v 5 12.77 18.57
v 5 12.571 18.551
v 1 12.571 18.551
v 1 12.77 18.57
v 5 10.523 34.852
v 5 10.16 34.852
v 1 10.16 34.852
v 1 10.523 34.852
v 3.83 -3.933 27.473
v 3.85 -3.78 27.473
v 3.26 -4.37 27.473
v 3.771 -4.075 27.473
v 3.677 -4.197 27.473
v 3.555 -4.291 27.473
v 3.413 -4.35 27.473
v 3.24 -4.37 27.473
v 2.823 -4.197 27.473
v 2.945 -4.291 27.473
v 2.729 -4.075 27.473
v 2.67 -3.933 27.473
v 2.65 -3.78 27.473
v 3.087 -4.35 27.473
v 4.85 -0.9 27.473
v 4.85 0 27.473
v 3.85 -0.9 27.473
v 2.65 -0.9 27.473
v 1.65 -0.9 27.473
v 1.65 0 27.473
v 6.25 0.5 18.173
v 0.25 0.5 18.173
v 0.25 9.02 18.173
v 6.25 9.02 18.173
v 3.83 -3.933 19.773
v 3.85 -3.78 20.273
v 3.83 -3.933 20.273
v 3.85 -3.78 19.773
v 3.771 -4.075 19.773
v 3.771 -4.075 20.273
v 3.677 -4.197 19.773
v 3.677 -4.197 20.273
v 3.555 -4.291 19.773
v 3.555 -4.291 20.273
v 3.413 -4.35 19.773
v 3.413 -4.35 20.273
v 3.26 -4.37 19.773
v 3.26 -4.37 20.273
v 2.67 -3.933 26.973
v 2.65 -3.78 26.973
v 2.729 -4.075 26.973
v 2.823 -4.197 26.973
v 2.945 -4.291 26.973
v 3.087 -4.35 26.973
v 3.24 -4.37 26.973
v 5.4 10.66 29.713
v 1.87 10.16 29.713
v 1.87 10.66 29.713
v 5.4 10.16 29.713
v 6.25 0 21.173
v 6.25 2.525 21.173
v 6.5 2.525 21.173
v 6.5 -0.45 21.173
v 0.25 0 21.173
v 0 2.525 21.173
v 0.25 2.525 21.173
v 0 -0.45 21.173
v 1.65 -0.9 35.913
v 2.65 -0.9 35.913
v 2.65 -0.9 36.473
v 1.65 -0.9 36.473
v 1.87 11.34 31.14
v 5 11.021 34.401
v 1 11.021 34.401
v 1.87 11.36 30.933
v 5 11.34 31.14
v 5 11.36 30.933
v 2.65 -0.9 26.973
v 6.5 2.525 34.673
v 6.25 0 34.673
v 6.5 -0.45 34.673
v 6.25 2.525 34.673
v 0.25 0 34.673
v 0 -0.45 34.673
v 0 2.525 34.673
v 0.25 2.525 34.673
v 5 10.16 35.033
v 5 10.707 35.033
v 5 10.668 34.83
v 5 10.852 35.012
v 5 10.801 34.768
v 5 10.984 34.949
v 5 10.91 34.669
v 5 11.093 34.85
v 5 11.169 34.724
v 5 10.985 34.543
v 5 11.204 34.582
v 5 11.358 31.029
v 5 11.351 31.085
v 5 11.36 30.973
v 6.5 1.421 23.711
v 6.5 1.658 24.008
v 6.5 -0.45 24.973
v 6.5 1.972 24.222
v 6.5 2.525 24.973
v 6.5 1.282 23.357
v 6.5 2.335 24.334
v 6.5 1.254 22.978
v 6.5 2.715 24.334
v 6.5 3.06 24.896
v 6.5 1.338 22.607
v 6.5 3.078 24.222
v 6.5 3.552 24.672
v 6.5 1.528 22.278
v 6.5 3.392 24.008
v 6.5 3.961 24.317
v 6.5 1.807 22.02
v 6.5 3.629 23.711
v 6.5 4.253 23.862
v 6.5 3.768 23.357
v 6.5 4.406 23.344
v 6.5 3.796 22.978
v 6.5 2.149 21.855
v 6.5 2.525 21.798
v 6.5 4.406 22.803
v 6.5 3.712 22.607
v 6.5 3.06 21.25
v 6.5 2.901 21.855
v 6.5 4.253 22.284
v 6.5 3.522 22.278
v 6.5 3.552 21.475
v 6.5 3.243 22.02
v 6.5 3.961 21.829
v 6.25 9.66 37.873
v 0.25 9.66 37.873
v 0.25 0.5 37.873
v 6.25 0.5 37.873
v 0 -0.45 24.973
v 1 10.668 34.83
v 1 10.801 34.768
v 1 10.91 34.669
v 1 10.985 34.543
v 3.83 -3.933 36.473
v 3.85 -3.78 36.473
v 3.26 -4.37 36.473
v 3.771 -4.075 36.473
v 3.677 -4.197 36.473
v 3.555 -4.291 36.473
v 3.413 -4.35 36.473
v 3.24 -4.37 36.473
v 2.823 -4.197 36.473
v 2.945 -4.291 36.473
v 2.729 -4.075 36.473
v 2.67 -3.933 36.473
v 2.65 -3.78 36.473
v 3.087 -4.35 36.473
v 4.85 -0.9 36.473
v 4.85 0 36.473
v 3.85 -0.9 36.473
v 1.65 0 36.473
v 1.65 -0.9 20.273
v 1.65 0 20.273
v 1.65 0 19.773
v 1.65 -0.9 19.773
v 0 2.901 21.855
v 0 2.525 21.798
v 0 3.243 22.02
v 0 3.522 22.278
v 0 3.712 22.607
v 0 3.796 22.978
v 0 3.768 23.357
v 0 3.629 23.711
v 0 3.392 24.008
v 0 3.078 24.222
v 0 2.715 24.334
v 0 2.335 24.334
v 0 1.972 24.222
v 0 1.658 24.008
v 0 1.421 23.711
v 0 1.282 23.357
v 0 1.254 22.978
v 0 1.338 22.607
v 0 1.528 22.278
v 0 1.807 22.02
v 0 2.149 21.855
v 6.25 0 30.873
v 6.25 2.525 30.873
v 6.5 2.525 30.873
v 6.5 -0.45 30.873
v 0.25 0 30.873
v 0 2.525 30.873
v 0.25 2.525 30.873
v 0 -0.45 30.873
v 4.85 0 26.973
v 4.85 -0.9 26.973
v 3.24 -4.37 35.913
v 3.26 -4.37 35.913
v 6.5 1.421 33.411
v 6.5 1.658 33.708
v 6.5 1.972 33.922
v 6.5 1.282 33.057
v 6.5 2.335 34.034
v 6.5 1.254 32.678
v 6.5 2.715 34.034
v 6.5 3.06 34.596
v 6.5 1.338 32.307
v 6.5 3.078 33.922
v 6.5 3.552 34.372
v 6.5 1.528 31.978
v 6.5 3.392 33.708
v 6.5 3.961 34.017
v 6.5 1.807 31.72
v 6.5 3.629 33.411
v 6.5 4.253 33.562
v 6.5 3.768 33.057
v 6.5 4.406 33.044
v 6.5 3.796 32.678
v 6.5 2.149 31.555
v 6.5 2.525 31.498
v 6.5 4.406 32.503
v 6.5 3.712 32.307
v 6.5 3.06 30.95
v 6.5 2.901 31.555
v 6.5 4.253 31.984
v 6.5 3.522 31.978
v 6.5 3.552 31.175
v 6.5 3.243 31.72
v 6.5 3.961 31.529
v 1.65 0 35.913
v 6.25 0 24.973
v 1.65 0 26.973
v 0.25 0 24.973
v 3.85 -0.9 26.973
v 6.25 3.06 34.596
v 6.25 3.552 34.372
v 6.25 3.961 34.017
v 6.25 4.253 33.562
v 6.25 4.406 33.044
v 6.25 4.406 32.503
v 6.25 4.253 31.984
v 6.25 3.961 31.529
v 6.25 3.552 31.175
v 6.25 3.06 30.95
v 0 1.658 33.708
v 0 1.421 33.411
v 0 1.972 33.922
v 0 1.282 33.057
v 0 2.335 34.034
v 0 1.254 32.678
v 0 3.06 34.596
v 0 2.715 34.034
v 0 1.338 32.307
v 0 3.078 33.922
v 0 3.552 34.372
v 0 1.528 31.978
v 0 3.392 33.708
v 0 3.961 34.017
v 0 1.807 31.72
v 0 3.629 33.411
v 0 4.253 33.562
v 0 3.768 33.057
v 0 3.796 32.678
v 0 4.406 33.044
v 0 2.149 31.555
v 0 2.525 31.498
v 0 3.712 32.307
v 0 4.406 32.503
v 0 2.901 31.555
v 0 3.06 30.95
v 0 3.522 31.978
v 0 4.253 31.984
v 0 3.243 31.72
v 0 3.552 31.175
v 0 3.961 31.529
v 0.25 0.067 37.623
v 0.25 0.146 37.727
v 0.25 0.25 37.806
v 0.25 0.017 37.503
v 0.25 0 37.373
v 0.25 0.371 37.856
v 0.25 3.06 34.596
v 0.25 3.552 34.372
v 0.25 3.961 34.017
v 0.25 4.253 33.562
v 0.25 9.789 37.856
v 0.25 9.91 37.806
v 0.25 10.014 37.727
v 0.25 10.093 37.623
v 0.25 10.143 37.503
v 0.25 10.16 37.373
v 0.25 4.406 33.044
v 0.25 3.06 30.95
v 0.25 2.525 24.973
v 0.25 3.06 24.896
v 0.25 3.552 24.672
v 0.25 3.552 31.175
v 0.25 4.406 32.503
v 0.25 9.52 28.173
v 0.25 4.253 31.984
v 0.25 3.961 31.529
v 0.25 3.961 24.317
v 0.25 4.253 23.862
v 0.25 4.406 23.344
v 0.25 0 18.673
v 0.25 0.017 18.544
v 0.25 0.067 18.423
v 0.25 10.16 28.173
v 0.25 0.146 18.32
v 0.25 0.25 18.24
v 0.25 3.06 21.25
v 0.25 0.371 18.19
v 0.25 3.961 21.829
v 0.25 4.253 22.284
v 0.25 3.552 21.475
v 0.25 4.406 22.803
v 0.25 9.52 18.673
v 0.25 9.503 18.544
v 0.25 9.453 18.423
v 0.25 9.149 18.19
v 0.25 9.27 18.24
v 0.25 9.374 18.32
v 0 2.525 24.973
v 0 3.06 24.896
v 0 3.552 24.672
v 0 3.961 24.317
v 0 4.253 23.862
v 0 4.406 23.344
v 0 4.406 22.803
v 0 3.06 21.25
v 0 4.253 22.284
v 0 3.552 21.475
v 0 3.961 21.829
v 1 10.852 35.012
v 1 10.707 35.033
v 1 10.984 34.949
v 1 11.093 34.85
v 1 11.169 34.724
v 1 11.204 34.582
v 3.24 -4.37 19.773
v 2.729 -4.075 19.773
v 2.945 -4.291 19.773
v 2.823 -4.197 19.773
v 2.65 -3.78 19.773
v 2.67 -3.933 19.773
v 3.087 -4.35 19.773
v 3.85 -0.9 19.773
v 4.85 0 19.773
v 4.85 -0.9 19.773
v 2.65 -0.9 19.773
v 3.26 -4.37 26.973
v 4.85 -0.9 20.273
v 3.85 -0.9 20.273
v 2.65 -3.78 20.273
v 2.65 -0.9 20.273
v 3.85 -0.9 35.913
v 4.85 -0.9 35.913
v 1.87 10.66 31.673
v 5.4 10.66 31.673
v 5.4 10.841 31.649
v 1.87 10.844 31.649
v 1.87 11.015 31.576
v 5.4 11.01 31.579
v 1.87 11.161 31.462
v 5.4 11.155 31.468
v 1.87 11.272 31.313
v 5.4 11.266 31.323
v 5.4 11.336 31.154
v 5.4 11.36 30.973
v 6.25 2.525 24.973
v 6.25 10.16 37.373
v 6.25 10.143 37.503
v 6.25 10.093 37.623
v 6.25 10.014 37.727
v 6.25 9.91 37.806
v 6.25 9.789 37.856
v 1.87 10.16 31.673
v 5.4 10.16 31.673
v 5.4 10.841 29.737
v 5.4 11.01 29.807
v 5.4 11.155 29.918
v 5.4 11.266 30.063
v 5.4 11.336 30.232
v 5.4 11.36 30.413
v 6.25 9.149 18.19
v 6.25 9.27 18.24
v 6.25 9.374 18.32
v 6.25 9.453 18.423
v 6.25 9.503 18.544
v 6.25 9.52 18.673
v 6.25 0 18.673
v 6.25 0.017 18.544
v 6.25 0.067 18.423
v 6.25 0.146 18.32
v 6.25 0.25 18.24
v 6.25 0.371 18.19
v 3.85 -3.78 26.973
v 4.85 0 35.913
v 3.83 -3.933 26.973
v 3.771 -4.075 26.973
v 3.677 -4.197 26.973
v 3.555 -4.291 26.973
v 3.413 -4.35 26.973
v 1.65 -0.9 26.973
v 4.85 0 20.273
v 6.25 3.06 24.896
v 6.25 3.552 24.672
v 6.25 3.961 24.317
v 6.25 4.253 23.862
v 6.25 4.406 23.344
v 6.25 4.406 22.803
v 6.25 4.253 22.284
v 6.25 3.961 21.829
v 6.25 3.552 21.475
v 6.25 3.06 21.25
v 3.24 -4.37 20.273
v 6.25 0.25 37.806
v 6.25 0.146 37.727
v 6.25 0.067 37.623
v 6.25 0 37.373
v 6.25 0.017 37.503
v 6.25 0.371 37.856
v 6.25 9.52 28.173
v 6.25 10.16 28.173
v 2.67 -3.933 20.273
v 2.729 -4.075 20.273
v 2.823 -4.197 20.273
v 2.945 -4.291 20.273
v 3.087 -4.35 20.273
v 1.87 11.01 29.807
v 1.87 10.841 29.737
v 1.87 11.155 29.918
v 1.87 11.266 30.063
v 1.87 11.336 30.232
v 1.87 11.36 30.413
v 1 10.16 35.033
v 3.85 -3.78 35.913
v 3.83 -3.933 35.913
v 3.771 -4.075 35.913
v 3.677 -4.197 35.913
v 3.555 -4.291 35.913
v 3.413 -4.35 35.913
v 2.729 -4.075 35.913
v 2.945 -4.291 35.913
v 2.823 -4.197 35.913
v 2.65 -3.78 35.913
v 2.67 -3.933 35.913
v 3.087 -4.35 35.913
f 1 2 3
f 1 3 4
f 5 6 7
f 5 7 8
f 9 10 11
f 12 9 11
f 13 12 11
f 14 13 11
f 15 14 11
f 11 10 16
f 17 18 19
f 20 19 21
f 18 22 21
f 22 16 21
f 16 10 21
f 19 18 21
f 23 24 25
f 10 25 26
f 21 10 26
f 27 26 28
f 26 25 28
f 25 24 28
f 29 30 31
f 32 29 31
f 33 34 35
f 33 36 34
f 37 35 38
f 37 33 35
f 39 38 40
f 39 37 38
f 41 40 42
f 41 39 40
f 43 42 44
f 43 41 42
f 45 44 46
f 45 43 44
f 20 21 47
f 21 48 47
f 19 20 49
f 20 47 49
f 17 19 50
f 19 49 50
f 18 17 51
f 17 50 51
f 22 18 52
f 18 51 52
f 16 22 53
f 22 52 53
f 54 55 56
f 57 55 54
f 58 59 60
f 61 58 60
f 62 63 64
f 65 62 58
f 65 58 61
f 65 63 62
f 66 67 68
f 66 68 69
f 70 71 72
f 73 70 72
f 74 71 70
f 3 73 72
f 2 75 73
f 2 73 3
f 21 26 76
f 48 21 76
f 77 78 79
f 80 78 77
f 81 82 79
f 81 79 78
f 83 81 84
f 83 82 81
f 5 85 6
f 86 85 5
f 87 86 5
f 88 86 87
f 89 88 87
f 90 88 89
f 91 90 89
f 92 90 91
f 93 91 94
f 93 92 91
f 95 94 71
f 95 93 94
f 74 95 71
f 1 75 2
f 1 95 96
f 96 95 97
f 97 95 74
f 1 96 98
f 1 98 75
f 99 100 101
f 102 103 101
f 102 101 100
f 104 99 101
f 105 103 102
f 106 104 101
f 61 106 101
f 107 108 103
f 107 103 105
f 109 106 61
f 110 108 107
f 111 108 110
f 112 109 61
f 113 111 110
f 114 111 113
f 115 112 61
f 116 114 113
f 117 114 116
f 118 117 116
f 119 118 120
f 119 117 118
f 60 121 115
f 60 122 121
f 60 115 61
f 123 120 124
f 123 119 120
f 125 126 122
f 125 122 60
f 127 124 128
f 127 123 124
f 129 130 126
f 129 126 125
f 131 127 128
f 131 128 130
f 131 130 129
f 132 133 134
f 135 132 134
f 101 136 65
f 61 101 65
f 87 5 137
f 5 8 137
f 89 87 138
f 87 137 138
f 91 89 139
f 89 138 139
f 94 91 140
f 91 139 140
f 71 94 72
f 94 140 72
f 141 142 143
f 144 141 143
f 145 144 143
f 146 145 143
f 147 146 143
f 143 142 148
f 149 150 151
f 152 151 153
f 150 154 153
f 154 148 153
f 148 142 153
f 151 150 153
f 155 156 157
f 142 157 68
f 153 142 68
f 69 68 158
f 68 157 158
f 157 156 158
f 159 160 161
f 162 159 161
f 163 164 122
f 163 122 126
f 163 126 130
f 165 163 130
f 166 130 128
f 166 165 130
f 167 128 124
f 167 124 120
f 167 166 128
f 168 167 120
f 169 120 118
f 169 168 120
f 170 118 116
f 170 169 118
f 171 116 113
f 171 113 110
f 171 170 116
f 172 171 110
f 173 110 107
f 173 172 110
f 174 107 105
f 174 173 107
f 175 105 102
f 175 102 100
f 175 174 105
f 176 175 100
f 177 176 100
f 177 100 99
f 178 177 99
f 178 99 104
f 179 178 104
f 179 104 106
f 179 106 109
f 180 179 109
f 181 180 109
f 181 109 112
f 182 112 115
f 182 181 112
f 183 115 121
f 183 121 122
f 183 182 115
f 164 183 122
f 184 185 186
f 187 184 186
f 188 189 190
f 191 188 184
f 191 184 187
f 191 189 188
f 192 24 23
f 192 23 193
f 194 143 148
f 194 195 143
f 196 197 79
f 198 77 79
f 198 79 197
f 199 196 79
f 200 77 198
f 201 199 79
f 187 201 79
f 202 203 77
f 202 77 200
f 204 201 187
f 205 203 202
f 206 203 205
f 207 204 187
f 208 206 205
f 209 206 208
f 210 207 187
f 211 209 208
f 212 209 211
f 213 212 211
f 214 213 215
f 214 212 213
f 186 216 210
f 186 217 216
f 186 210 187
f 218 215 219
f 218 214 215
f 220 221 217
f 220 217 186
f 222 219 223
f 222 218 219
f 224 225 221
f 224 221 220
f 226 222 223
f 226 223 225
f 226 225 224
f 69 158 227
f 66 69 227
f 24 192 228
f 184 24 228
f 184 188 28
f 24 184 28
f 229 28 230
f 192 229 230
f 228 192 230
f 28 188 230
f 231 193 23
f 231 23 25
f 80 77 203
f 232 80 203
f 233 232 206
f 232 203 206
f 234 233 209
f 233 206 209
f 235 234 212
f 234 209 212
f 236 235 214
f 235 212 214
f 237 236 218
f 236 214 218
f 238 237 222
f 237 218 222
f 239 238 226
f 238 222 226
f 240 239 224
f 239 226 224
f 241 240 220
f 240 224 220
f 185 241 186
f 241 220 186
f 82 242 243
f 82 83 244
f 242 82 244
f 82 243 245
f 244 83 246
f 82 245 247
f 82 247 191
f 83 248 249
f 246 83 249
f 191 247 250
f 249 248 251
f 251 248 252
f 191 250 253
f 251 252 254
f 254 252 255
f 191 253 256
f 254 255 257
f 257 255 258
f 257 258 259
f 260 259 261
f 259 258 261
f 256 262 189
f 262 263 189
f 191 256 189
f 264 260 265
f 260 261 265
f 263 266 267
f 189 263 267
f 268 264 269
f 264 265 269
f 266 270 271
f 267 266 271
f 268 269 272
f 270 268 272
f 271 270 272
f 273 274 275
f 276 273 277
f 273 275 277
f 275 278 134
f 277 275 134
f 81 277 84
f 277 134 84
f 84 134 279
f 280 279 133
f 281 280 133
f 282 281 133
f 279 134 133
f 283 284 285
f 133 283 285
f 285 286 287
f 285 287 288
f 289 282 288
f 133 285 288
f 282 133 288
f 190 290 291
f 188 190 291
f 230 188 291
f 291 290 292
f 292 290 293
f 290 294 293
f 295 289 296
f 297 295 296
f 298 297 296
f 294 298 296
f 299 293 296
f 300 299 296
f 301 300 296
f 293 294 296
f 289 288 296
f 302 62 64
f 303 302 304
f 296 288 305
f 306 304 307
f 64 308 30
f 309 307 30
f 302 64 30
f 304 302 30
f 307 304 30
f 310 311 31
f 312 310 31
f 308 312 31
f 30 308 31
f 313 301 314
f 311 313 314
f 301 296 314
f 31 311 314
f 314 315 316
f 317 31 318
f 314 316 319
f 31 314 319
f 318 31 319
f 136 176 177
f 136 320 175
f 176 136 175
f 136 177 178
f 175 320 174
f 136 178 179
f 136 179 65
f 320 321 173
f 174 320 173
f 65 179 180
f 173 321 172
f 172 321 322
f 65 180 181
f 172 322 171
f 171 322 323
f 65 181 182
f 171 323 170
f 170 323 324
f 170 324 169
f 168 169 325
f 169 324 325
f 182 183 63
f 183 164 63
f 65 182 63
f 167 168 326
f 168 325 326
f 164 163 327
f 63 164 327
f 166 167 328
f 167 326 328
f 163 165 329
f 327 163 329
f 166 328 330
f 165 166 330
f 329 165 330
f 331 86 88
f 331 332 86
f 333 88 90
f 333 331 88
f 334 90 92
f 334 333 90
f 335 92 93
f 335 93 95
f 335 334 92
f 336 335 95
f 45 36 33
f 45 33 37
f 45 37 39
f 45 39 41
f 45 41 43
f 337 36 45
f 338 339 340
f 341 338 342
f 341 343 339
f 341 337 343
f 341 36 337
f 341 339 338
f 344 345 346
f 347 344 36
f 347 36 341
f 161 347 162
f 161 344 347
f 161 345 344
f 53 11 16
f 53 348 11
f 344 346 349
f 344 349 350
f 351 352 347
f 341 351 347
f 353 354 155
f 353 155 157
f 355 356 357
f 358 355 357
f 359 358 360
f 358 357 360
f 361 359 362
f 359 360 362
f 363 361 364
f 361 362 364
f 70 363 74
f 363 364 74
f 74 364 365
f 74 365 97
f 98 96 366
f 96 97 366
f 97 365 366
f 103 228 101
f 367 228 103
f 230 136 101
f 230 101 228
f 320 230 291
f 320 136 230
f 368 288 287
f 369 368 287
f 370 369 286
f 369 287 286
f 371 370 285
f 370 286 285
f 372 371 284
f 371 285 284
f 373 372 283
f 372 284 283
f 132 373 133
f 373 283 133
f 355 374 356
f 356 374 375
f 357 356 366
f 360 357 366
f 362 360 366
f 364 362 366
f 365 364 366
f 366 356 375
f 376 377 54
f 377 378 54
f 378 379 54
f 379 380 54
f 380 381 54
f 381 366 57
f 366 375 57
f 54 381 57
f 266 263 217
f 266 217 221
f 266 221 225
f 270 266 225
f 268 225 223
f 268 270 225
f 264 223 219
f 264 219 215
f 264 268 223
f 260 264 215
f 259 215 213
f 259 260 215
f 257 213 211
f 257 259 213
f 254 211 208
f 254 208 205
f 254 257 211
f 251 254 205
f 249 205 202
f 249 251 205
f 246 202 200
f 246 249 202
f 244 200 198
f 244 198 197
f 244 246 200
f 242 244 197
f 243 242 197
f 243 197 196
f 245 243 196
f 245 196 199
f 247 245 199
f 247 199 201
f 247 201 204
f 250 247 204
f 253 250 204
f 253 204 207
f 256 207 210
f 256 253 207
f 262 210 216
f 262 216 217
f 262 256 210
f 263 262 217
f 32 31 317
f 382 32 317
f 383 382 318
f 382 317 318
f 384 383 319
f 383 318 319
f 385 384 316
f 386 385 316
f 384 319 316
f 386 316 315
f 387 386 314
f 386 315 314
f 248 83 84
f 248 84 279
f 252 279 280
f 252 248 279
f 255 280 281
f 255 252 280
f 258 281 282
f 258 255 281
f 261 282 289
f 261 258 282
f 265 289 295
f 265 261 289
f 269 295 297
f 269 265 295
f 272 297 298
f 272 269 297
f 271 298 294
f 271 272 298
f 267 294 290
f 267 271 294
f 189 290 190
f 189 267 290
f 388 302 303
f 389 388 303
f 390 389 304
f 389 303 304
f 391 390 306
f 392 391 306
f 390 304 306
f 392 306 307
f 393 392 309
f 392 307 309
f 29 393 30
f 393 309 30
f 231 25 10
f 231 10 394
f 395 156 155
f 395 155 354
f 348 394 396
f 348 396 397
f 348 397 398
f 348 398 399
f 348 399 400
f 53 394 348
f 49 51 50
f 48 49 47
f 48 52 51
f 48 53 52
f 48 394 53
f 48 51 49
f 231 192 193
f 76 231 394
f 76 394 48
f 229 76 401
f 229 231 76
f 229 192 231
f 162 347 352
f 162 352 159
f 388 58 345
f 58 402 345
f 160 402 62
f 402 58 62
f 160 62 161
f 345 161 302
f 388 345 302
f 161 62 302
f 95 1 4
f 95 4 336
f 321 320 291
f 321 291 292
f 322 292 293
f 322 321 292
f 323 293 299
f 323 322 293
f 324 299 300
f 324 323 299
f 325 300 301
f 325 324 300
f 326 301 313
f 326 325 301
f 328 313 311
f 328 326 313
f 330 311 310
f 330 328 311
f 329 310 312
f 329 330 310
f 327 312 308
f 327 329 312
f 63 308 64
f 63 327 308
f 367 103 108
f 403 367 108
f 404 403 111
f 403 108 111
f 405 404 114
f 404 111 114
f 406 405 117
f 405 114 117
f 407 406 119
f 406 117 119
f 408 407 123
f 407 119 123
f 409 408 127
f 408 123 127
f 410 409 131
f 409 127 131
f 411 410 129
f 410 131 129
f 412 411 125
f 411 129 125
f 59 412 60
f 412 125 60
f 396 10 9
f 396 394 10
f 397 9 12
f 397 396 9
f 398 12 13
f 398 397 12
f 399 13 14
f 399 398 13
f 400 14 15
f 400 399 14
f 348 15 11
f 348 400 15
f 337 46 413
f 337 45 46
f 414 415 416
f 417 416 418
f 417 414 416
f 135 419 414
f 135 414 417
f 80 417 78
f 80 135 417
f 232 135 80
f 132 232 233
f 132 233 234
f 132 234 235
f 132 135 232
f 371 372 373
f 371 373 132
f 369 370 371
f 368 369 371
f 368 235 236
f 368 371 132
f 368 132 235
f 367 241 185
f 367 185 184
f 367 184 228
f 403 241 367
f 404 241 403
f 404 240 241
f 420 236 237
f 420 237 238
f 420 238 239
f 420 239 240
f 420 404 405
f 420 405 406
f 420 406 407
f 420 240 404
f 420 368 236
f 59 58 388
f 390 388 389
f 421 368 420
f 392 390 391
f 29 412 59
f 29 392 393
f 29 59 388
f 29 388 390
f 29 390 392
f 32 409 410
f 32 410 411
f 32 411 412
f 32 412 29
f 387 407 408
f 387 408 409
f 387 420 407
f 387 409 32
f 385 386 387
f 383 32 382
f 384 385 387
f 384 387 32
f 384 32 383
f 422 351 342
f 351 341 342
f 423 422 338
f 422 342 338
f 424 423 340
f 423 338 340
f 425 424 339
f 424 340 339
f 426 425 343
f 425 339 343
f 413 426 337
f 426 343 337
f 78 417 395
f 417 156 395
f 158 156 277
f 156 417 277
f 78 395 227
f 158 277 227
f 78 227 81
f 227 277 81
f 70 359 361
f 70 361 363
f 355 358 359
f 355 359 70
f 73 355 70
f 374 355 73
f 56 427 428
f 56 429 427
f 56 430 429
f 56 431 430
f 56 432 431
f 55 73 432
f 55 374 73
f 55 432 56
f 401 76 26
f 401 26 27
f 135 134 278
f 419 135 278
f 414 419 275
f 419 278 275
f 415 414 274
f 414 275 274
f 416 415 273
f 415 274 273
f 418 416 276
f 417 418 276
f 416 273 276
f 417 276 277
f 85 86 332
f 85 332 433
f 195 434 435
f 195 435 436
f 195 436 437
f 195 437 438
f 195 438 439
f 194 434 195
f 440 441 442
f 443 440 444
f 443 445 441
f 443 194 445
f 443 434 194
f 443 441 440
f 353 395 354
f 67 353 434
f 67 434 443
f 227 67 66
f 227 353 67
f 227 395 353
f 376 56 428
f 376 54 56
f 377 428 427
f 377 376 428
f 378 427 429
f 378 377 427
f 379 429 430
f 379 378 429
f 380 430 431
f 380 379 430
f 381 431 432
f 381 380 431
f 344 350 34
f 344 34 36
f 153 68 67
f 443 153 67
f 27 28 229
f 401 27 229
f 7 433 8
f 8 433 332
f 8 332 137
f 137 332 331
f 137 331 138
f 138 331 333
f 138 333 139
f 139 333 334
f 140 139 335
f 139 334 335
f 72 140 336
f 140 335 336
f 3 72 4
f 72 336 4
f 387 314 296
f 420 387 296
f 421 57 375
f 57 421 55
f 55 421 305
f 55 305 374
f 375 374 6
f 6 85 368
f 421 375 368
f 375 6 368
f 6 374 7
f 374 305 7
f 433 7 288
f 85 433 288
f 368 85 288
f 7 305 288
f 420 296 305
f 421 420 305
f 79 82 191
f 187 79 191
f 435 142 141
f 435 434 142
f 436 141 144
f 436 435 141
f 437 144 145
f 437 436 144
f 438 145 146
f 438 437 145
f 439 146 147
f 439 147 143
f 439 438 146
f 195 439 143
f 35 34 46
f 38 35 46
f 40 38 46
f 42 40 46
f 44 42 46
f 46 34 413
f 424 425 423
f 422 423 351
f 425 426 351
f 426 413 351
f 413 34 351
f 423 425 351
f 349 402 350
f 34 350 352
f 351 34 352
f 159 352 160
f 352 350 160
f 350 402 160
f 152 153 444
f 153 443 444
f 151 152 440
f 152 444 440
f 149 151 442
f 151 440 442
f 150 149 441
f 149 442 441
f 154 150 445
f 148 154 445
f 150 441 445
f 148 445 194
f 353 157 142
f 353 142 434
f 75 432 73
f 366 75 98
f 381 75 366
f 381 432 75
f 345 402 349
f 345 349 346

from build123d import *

# Parameters (mm, degrees)
SKETCH1_R           = 1.275
BOSS_EXTRUDE1_DEPTH = 6.5
SKETCH2_W           = 3.53
SKETCH2_H           = 1.96
BOSS_EXTRUDE2_DEPTH = 1.2
FILLET1_R           = 0.7
SKETCH3_W           = 3.2
SKETCH3_H           = 0.56
SKETCH3_H_2         = 0.5
BOSS_EXTRUDE3_DEPTH = 0.9
SKETCH4_W           = 1.2
SKETCH4_H           = 0.56
SKETCH4_H_2         = 0.5
BOSS_EXTRUDE4_DEPTH = 3.47
FILLET2_R           = 0.59
EXTRUDE_START       = -1.5
EXTRUDE_1_DEPTH     = 4
FILLET_1_R          = 0.5
EXTRUDE1_DEPTH      = 0.25
EXTRUDE2_START      = -6.5
EXTRUDE2_DEPTH      = 0.25


with BuildPart() as part:
    # Sketch1 → Boss-Extrude1 (new body)
    with BuildSketch(Plane(origin=(0, 0, 0), x_dir=(0, 0, -1), z_dir=(1, 0, 0))):
        with BuildLine():
            Line((-37.373122581, 0), (-34.673122581, 0))
            Line((-34.673122581, 0), (-34.673122581, -0.45))
            Line((-34.673122581, -0.45), (-30.873122581, -0.45))
            Line((-30.873122581, -0.45), (-30.873122581, 0))
            Line((-30.873122581, 0), (-24.973122581, 0))
            Line((-24.973122581, 0), (-24.973122581, -0.45))
            Line((-24.973122581, -0.45), (-21.173122581, -0.45))
            Line((-21.173122581, -0.45), (-21.173122581, 0))
            Line((-21.173122581, 0), (-18.673122581, 0))
            ThreePointArc((-18.673122581, 0), (-18.31956919, 0.146446609), (-18.173122581, 0.5))
            Line((-18.173122581, 0.5), (-18.173122581, 9.02))
            ThreePointArc((-18.173122581, 9.02), (-18.31956919, 9.373553391), (-18.673122581, 9.52))
            Line((-18.673122581, 9.52), (-28.173122581, 9.52))
            Line((-28.173122581, 9.52), (-28.173122581, 10.16))
            Line((-28.173122581, 10.16), (-37.373122581, 10.16))
            ThreePointArc((-37.373122581, 10.16), (-37.726675972, 10.013553391), (-37.873122581, 9.66))
            Line((-37.873122581, 9.66), (-37.873122581, 0.5))
            ThreePointArc((-37.873122581, 0.5), (-37.726675972, 0.146446609), (-37.373122581, 0))
        make_face()
        with Locations((-32.773122581, 2.525)):
            Circle(SKETCH1_R, mode=Mode.SUBTRACT)
        with Locations((-23.073122581, 2.525)):
            Circle(SKETCH1_R, mode=Mode.SUBTRACT)
    extrude(amount=BOSS_EXTRUDE1_DEPTH)

    # Sketch2 → Boss-Extrude2 (add)
    with BuildSketch(Plane(origin=(0, 10.16, 0), x_dir=(1, 0, 0), z_dir=(0, 1, 0))):
        with Locations((3.635, -30.693122581)):
            Rectangle(SKETCH2_W, SKETCH2_H)
    extrude(amount=BOSS_EXTRUDE2_DEPTH)

    # Fillet1
    fillet1_edges = [part.edges().sort_by_distance(p)[0] for p in [
        (3.635, 11.36, 31.673122581),
        (3.635, 11.36, 29.713122581),
    ]]
    fillet(fillet1_edges, radius=FILLET1_R)

    # Sketch3 → Boss-Extrude3 (add)
    with BuildSketch(Plane(origin=(0, 0, 0), x_dir=(-1, 0, 0), z_dir=(0, -1, 0))):
        with Locations((-3.25, -36.193122581)):
            Rectangle(SKETCH3_W, SKETCH3_H)
        with Locations((-3.25, -27.223122581)):
            Rectangle(SKETCH3_W, SKETCH3_H_2)
        with Locations((-3.25, -20.023122581)):
            Rectangle(SKETCH3_W, SKETCH3_H_2)
    extrude(amount=BOSS_EXTRUDE3_DEPTH)

    # Sketch4 → Boss-Extrude4 (add)
    with BuildSketch(Plane(origin=(0, -0.9, 0), x_dir=(-1, 0, 0), z_dir=(0, -1, 0))):
        with Locations((-3.25, -36.193122581)):
            Rectangle(SKETCH4_W, SKETCH4_H)
        with Locations((-3.25, -27.223122581)):
            Rectangle(SKETCH4_W, SKETCH4_H_2)
        with Locations((-3.25, -20.023122581)):
            Rectangle(SKETCH4_W, SKETCH4_H_2)
    extrude(amount=BOSS_EXTRUDE4_DEPTH)

    # Fillet2
    fillet2_edges = [part.edges().sort_by_distance(p)[0] for p in [
        (2.65, -4.37, 36.193122581),
        (3.85, -4.37, 36.193122581),
        (2.65, -4.37, 27.223122581),
        (3.85, -4.37, 27.223122581),
        (3.85, -4.37, 20.023122581),
        (2.65, -4.37, 20.023122581),
    ]]
    fillet(fillet2_edges, radius=FILLET2_R)

    # Эскиз1 → Бобышка-Вытянуть1 (add)
    with BuildSketch(Plane(origin=(6.5, 0, 0), x_dir=(0, 0, -1), z_dir=(1, 0, 0)).offset(EXTRUDE_START)):
        Polygon((-34.851945428, 10.16), (-34.851945428, 10.976764044), (-18.550578779, 12.570949573), (-18.570044834, 12.77), (-35.033122581, 11.16), (-35.033122581, 10.16), align=None)
    extrude(amount=-EXTRUDE_1_DEPTH)

    # Скругление1
    fillet_1_edges = [part.edges().sort_by_distance(p)[0] for p in [
        (3, 11.16, 35.033122581),
        (3, 10.976764044, 34.851945428),
    ]]
    fillet(fillet_1_edges, radius=FILLET_1_R)

    # Sketch6 → Extrude1 (cut)
    with BuildSketch(Plane(origin=(6.5, 0, 0), x_dir=(0, 0, -1), z_dir=(1, 0, 0))):
        with BuildLine():
            Line((-34.673122581, 0), (-34.673122581, 2.525))
            ThreePointArc((-34.673122581, 2.525), (-32.773122581, 4.425), (-30.873122581, 2.525))
            Line((-30.873122581, 2.525), (-30.873122581, 0))
            Line((-30.873122581, 0), (-24.973122581, 0))
            Line((-24.973122581, 0), (-24.973122581, 2.525))
            ThreePointArc((-24.973122581, 2.525), (-23.073122581, 4.425), (-21.173122581, 2.525))
            Line((-21.173122581, 2.525), (-21.173122581, 0))
            Line((-21.173122581, 0), (-18.673122581, 0))
            ThreePointArc((-18.673122581, 0), (-18.31956919, 0.146446609), (-18.173122581, 0.5))
            Line((-18.173122581, 0.5), (-18.173122581, 9.02))
            ThreePointArc((-18.173122581, 9.02), (-18.31956919, 9.373553391), (-18.673122581, 9.52))
            Line((-18.673122581, 9.52), (-28.173122581, 9.52))
            Line((-28.173122581, 9.52), (-28.173122581, 10.16))
            Line((-28.173122581, 10.16), (-37.373122581, 10.16))
            ThreePointArc((-37.373122581, 10.16), (-37.726675972, 10.013553391), (-37.873122581, 9.66))
            Line((-37.873122581, 9.66), (-37.873122581, 0.5))
            ThreePointArc((-37.873122581, 0.5), (-37.726675972, 0.146446609), (-37.373122581, 0))
            Line((-37.373122581, 0), (-34.673122581, 0))
        make_face()
    extrude(amount=-EXTRUDE1_DEPTH, mode=Mode.SUBTRACT)

    # Sketch → Extrude2 (cut)
    with BuildSketch(Plane(origin=(6.5, 0, 0), x_dir=(0, 0, -1), z_dir=(1, 0, 0)).offset(EXTRUDE2_START)):
        with BuildLine():
            Line((-34.673122581, 0), (-34.673122581, 2.525))
            ThreePointArc((-34.673122581, 2.525), (-32.773122581, 4.425), (-30.873122581, 2.525))
            Line((-30.873122581, 2.525), (-30.873122581, 0))
            Line((-30.873122581, 0), (-24.973122581, 0))
            Line((-24.973122581, 0), (-24.973122581, 2.525))
            ThreePointArc((-24.973122581, 2.525), (-23.073122581, 4.425), (-21.173122581, 2.525))
            Line((-21.173122581, 2.525), (-21.173122581, 0))
            Line((-21.173122581, 0), (-18.673122581, 0))
            ThreePointArc((-18.673122581, 0), (-18.31956919, 0.146446609), (-18.173122581, 0.5))
            Line((-18.173122581, 0.5), (-18.173122581, 9.02))
            ThreePointArc((-18.173122581, 9.02), (-18.31956919, 9.373553391), (-18.673122581, 9.52))
            Line((-18.673122581, 9.52), (-28.173122581, 9.52))
            Line((-28.173122581, 9.52), (-28.173122581, 10.16))
            Line((-28.173122581, 10.16), (-37.373122581, 10.16))
            ThreePointArc((-37.373122581, 10.16), (-37.726675972, 10.013553391), (-37.873122581, 9.66))
            Line((-37.873122581, 9.66), (-37.873122581, 0.5))
            ThreePointArc((-37.873122581, 0.5), (-37.726675972, 0.146446609), (-37.373122581, 0))
            Line((-37.373122581, 0), (-34.673122581, 0))
        make_face()
    extrude(amount=EXTRUDE2_DEPTH, mode=Mode.SUBTRACT)


solid = part.part
